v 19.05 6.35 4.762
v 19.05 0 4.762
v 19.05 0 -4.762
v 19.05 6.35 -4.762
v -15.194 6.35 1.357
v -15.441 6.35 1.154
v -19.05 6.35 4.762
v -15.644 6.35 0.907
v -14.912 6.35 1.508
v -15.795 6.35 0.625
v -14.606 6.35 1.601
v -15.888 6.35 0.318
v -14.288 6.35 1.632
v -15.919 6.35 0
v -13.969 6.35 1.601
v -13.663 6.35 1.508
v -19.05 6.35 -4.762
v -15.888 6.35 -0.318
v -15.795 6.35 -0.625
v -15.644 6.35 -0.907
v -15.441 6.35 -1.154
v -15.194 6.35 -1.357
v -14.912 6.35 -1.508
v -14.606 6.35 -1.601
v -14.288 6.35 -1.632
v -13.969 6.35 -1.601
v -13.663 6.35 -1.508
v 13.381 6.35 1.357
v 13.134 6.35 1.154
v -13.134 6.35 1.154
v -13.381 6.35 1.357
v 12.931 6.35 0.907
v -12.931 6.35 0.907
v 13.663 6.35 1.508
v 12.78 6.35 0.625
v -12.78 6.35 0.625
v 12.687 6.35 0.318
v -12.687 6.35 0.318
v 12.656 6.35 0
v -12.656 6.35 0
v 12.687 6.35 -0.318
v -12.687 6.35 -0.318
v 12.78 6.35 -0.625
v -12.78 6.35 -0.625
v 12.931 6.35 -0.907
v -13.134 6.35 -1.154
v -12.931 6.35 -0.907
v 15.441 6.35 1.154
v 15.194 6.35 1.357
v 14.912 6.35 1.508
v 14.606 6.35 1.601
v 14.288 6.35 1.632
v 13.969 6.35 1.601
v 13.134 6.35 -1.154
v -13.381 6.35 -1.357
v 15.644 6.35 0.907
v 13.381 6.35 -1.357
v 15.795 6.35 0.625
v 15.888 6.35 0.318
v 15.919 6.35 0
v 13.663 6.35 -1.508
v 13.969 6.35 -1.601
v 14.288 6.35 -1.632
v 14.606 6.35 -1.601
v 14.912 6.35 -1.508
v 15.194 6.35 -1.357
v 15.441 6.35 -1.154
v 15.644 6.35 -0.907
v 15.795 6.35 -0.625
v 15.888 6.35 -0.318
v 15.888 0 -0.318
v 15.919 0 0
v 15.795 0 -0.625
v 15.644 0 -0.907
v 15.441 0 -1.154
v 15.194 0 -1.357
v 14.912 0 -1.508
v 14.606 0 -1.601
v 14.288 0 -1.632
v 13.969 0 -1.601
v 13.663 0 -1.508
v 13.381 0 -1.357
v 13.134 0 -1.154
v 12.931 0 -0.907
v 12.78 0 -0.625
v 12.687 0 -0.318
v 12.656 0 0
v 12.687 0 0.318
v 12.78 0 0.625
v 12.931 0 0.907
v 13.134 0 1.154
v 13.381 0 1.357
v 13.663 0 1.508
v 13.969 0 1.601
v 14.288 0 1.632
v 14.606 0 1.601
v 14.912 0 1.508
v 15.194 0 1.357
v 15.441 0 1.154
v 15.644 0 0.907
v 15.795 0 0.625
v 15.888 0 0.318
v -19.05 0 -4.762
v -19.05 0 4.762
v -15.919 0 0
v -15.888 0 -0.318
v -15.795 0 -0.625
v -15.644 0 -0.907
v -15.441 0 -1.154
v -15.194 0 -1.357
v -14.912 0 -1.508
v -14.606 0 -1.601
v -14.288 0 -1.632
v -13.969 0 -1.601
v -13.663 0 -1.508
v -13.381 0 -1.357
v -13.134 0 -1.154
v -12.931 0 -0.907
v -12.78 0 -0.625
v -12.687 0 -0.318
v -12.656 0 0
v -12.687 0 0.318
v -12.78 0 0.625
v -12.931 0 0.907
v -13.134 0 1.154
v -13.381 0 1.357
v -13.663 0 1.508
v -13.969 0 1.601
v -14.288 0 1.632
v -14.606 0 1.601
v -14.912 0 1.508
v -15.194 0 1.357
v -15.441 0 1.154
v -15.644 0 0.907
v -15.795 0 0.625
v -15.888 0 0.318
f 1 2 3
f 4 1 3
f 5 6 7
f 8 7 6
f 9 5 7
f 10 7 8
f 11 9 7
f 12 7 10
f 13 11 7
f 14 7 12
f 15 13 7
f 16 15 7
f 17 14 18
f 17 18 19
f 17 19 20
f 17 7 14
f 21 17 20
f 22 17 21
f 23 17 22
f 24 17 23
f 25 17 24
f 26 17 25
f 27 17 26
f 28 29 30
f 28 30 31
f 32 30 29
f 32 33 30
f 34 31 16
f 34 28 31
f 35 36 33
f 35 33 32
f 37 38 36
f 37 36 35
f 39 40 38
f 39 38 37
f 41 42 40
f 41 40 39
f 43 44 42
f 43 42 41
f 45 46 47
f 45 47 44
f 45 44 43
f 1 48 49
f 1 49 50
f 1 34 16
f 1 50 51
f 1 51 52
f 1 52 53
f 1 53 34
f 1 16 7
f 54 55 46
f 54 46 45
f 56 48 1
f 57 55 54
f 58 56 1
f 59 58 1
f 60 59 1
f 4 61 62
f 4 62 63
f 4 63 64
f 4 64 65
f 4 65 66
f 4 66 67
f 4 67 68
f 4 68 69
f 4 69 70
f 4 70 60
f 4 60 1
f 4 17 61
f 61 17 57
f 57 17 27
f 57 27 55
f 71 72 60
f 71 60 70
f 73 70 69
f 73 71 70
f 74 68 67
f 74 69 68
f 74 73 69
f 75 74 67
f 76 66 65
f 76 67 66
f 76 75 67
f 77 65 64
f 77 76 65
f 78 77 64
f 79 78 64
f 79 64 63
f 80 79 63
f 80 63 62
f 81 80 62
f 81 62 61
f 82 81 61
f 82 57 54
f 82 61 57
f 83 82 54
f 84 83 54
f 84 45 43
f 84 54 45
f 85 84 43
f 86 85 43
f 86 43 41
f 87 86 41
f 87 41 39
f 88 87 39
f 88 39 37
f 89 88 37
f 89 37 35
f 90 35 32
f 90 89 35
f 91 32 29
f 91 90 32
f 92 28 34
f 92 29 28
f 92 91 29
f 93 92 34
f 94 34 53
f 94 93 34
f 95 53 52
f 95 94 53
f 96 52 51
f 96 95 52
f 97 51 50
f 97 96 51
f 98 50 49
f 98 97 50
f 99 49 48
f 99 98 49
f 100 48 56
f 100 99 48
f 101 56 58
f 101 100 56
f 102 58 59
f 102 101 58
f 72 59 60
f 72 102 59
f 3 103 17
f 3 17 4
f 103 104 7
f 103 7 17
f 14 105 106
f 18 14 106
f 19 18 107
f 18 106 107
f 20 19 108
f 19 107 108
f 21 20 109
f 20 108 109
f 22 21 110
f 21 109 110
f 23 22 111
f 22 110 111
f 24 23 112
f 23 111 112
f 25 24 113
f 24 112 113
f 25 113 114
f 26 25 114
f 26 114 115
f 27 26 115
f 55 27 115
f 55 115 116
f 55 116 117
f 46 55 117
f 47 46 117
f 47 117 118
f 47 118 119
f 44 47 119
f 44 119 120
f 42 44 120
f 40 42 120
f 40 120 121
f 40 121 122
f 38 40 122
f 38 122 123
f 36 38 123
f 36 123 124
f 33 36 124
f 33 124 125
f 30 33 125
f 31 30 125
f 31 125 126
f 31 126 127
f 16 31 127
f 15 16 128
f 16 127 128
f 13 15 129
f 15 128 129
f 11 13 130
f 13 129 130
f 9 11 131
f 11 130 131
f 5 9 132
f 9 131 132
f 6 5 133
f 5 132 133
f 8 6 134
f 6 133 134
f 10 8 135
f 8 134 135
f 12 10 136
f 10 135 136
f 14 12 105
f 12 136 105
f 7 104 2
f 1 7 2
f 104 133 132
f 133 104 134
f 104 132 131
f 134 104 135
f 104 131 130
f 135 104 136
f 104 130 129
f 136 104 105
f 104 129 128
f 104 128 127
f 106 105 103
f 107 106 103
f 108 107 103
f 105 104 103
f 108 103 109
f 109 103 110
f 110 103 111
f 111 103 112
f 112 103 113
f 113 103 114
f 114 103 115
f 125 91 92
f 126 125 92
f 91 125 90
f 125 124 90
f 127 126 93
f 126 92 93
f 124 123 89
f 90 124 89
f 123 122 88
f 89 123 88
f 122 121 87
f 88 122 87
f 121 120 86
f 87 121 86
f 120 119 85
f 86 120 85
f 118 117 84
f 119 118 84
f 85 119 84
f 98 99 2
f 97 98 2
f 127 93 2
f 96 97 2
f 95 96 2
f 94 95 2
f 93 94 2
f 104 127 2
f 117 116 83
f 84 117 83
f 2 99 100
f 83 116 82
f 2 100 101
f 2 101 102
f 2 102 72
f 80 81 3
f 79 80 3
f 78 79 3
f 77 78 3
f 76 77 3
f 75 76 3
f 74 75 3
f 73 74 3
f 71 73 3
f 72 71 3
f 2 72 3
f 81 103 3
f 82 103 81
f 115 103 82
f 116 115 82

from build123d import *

# Parameters (mm, degrees)
SKETCH1_W             = 38.1
SKETCH1_H             = 9.525
BOSS_EXTRUDE1_DEPTH   = 6.35
F_4_CLEARANCE_HOLE1_D = 3.2639


with BuildPart() as part:
    # Sketch1 → Boss-Extrude1 (new body)
    with BuildSketch(Plane(origin=(0, 0, 0), x_dir=(1, 0, 0), z_dir=(0, 1, 0))):
        Rectangle(SKETCH1_W, SKETCH1_H)
    extrude(amount=BOSS_EXTRUDE1_DEPTH)

    # #4 Clearance Hole1 (through all)
    with Locations(Plane(origin=(0, 6.35, 0), x_dir=(1, 0, 0), z_dir=(0, 1, 0))):
        with Locations((-14.2875, 0)):
            f_4_clearance_hole1 = Hole(F_4_CLEARANCE_HOLE1_D / 2)

    # Mirror1: #4 Clearance Hole1 across plane
    add(f_4_clearance_hole1.mirror(Plane(origin=(0, 0, 0), x_dir=(0, 0, 1), z_dir=(1, 0, 0))), mode=Mode.SUBTRACT)


solid = part.part
